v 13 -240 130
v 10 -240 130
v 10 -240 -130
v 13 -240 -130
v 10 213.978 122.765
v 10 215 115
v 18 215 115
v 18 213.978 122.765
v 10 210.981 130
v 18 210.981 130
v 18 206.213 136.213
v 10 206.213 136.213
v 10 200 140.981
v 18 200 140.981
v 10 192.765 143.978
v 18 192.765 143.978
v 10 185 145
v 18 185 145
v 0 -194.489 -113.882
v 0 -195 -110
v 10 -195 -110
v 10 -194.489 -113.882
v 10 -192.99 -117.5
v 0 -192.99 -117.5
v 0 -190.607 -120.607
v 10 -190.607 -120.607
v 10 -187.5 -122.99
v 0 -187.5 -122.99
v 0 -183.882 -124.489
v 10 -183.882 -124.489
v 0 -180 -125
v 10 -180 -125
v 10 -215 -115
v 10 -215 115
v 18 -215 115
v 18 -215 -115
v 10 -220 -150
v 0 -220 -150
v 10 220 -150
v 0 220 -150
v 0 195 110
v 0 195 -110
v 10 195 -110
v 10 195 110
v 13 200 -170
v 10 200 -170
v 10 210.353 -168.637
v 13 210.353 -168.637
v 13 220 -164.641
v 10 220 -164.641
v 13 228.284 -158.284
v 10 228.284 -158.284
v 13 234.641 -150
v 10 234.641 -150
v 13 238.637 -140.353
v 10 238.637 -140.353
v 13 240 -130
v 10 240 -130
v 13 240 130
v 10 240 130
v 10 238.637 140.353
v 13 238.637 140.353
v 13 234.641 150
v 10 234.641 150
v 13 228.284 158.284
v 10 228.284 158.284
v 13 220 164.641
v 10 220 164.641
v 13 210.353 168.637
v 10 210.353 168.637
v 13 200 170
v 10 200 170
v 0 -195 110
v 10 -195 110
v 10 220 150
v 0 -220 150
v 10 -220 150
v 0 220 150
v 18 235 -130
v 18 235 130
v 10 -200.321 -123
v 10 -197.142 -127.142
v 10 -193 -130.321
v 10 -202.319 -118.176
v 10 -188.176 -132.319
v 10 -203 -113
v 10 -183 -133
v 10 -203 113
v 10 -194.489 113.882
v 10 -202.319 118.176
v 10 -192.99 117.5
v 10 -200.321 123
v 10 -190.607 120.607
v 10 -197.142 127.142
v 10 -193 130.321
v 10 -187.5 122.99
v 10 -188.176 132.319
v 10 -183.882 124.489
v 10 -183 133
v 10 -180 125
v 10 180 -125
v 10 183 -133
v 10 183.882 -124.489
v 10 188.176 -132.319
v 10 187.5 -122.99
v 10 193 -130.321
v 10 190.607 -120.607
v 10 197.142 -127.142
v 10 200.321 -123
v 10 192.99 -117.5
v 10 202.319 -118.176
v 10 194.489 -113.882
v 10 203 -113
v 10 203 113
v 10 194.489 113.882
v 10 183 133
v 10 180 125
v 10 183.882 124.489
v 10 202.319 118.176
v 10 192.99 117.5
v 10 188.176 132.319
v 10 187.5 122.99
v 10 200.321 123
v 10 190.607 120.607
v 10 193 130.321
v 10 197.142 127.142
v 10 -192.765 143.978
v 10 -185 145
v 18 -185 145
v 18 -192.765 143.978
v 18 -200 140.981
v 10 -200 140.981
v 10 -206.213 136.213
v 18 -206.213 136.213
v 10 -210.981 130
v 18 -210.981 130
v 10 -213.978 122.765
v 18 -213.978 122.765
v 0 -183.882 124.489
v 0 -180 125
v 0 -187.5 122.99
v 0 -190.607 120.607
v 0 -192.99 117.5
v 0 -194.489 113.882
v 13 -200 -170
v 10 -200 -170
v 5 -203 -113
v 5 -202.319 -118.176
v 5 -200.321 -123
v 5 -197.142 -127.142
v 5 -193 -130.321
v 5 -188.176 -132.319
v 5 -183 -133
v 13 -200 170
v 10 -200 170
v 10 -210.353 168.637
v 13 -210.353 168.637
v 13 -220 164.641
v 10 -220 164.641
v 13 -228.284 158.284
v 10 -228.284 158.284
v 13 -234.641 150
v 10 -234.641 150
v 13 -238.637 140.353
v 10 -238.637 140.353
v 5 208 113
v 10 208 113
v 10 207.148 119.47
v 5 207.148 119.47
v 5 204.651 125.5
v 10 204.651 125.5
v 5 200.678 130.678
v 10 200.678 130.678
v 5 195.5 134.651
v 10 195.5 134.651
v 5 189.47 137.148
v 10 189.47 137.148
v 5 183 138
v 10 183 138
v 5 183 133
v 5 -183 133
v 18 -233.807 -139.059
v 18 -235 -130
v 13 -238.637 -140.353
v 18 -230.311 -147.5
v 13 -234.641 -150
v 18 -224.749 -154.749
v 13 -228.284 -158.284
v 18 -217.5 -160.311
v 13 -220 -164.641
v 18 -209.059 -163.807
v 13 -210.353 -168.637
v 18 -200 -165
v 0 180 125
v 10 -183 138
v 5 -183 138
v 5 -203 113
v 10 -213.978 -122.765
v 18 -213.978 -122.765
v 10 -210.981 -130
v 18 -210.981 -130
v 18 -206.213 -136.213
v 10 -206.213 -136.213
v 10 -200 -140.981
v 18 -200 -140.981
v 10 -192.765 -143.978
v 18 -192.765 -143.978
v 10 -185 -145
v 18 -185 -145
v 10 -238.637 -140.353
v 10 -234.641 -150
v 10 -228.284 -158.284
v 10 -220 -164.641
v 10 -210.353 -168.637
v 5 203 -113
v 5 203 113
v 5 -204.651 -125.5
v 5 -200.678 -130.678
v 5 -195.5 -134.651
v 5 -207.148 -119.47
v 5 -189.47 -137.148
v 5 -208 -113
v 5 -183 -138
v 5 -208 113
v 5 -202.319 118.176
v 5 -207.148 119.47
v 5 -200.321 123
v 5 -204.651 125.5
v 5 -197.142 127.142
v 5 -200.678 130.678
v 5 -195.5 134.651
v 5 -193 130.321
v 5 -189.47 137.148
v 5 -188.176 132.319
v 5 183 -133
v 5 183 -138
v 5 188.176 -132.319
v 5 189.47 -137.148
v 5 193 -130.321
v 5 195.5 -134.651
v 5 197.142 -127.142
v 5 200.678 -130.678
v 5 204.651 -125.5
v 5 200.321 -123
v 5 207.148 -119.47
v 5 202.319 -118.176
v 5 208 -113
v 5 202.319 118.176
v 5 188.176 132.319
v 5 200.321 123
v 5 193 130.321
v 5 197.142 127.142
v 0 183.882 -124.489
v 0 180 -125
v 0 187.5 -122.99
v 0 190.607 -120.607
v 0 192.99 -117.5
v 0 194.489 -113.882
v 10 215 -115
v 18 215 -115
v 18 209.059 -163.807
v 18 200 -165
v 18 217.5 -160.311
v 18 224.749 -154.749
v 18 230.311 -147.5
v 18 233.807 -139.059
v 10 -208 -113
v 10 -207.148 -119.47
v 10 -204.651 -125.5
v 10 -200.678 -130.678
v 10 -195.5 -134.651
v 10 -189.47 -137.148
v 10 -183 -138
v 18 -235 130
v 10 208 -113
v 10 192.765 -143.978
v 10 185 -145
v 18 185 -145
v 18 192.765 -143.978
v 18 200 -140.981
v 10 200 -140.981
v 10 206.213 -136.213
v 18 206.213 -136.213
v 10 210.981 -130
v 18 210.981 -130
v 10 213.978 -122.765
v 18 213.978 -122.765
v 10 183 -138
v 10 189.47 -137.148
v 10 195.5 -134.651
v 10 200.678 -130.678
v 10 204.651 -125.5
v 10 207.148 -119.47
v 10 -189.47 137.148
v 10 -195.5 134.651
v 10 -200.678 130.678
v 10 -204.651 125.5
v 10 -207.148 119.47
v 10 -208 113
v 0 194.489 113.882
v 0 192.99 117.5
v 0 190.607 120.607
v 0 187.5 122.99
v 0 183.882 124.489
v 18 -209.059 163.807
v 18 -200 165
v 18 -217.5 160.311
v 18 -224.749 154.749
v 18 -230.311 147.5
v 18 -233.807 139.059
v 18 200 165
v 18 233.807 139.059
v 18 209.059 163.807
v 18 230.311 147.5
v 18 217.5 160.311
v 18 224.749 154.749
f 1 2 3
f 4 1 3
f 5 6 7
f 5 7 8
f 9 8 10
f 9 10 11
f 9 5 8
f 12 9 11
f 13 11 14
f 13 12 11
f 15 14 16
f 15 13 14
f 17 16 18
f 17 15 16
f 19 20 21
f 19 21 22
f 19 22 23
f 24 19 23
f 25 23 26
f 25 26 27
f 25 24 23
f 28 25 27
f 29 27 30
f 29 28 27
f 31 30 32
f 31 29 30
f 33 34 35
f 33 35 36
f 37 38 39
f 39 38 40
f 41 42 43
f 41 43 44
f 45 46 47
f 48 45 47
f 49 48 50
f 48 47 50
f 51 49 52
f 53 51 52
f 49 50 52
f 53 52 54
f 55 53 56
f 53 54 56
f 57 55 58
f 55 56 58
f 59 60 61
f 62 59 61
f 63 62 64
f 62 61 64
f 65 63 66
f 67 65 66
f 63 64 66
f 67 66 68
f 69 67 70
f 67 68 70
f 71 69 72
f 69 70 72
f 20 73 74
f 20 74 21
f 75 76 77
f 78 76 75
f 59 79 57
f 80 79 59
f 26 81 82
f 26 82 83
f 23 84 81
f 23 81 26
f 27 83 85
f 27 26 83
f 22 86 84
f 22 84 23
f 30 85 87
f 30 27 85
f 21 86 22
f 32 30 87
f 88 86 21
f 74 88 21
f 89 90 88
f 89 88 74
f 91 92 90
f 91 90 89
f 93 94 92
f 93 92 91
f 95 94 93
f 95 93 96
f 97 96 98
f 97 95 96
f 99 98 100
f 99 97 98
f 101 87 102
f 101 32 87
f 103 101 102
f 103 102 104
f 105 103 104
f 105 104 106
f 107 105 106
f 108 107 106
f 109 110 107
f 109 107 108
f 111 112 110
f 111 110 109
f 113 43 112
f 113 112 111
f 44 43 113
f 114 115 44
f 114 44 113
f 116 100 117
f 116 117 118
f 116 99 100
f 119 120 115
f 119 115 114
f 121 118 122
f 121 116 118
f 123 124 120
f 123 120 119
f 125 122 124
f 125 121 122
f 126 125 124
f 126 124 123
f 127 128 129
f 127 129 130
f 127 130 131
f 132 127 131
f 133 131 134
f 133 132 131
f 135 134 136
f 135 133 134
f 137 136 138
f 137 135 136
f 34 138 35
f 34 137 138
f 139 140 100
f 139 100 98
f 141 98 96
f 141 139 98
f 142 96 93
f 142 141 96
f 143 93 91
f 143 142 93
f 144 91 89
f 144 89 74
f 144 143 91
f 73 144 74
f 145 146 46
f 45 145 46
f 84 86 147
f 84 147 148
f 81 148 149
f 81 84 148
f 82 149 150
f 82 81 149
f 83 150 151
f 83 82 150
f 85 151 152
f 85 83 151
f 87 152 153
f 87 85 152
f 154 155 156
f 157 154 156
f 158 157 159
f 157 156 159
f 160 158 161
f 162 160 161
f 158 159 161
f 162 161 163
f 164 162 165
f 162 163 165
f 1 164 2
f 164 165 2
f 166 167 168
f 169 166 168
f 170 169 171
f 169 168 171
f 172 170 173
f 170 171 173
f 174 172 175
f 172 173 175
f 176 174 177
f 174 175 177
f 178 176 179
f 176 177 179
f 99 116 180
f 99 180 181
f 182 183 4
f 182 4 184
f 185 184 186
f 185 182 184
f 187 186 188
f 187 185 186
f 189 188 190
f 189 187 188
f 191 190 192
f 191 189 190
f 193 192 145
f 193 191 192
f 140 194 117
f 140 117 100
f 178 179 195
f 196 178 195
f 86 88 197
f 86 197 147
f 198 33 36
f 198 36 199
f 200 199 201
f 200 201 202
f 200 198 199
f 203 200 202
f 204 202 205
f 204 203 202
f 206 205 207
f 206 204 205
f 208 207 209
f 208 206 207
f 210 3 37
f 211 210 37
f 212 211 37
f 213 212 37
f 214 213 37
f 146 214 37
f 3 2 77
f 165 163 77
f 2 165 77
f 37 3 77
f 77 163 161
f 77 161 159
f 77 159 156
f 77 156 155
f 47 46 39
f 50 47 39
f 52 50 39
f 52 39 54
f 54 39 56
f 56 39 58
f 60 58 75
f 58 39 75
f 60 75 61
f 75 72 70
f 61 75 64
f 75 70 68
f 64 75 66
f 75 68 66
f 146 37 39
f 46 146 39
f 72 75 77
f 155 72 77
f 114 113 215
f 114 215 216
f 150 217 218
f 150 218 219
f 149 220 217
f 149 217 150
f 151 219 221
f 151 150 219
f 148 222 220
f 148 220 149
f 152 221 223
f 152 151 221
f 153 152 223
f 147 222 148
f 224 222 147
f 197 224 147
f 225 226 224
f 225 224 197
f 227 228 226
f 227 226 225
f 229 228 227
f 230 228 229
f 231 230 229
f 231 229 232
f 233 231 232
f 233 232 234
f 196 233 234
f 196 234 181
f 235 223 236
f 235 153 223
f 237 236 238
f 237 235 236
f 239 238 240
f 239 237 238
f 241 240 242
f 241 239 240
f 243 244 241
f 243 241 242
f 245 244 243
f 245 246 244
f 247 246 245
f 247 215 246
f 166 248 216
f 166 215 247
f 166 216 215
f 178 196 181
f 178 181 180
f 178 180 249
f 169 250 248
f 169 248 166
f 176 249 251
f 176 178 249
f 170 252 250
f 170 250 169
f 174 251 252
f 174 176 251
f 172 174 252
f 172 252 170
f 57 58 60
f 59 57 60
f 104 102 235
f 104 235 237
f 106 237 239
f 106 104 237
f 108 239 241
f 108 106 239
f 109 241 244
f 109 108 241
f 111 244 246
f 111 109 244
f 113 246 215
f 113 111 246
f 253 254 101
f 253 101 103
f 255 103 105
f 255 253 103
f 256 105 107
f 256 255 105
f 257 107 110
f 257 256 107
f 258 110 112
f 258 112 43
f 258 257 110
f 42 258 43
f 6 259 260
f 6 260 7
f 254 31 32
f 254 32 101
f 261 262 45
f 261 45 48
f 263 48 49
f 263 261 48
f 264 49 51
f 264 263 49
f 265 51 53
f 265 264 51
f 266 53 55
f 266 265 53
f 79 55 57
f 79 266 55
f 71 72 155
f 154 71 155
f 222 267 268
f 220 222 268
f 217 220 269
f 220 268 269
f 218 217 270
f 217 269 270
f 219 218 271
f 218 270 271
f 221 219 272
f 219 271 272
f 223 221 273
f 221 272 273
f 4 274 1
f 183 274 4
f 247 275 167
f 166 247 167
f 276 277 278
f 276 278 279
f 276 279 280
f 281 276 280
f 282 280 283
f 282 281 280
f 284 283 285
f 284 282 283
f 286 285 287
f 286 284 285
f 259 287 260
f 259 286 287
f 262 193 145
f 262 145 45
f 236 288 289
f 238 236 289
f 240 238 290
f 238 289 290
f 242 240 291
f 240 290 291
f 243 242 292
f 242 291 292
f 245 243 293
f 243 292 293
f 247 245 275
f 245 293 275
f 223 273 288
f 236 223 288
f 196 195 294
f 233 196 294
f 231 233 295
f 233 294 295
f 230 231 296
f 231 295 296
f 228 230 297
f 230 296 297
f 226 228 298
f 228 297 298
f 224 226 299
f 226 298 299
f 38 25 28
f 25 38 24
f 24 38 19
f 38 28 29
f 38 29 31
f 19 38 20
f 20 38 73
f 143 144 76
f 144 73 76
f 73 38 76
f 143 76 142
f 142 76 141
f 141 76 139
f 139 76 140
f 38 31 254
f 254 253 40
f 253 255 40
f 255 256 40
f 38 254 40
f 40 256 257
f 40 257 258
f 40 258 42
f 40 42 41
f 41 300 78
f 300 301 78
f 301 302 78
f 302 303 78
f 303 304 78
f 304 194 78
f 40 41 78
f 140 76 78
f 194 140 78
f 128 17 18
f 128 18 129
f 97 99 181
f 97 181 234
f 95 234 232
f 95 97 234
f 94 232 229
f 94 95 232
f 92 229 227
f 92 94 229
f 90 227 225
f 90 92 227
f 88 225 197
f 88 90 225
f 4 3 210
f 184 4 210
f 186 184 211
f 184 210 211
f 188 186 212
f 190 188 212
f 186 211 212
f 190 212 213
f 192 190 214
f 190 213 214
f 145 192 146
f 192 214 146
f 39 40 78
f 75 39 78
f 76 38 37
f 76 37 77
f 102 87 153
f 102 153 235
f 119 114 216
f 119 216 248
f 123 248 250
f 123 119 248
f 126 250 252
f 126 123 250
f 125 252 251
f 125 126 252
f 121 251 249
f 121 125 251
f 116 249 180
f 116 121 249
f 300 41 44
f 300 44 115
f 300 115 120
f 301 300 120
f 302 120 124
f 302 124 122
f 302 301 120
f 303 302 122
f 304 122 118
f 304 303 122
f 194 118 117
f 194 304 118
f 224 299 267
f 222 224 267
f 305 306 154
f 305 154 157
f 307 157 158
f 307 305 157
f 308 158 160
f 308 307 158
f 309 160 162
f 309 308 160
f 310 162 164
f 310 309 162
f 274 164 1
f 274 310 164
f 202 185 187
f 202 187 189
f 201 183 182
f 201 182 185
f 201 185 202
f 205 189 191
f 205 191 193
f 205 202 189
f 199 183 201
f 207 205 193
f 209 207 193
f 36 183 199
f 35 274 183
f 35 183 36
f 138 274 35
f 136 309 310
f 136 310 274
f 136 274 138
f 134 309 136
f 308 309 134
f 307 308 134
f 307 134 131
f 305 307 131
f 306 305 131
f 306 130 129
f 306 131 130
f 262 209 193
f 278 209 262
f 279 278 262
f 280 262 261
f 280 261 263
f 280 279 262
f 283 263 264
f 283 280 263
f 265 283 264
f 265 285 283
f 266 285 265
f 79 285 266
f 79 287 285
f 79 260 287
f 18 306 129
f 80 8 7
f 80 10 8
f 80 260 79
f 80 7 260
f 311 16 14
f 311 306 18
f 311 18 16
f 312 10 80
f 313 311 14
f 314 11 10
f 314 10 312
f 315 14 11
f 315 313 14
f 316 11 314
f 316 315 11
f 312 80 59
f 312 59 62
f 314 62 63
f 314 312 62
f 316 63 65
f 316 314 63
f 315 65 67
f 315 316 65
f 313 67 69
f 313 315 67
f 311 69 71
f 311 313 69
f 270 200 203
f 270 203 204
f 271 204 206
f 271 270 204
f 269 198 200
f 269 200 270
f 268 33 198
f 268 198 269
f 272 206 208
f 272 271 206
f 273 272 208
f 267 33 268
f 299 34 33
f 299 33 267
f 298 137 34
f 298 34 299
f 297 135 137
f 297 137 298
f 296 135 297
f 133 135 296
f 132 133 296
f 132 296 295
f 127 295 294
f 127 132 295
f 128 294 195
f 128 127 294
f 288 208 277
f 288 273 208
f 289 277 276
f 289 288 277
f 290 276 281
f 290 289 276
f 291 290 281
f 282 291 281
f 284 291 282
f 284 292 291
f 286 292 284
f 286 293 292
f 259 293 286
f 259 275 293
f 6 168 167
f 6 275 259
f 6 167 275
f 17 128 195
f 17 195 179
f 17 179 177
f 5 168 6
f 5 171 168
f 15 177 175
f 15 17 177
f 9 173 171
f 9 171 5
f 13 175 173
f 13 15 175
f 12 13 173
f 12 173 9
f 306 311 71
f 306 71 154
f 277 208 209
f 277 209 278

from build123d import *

# Parameters (mm, degrees)
SKETCH_W     = 440
SKETCH_H     = 300
PAD_DEPTH    = 10
PAD001_DEPTH = 8
POCKET_DEPTH = 5
CHAMFER_SIZE = 5


with BuildPart() as part:
    # Sketch → Pad (new body)
    with BuildSketch(Plane.YZ):
        Rectangle(SKETCH_W, SKETCH_H)
        with BuildLine():
            Line((-195, 110), (-195, -110))
            ThreePointArc((-195, -110), (-190.606602, -120.606602), (-180, -125))
            Line((-180, -125), (180, -125))
            ThreePointArc((180, -125), (190.606602, -120.606602), (195, -110))
            Line((195, -110), (195, 110))
            ThreePointArc((195, 110), (190.606602, 120.606602), (180, 125))
            Line((180, 125), (-180, 125))
            ThreePointArc((-180, 125), (-190.606602, 120.606602), (-195, 110))
        make_face(mode=Mode.SUBTRACT)
    extrude(amount=PAD_DEPTH)

    # Sketch001 (on Face14 of Pad) → Pad001 (join)
    with BuildSketch(Plane.YZ.offset(10)):
        with BuildLine():
            Line((-240, 130), (-240, -130))
            ThreePointArc((-240, -130), (-228.284271, -158.284271), (-200, -170))
            Line((-200, -170), (200, -170))
            ThreePointArc((200, -170), (228.284271, -158.284271), (240, -130))
            Line((240, -130), (240, 130))
            ThreePointArc((240, 130), (228.284271, 158.284271), (200, 170))
            Line((200, 170), (-200, 170))
            ThreePointArc((-200, 170), (-228.284271, 158.284271), (-240, 130))
        make_face()
        with BuildLine():
            Line((-215, 115), (-215, -115))
            ThreePointArc((-215, -115), (-206.213203, -136.213203), (-185, -145))
            Line((-185, -145), (185, -145))
            ThreePointArc((185, -145), (206.213203, -136.213203), (215, -115))
            Line((215, -115), (215, 115))
            ThreePointArc((215, 115), (206.213203, 136.213203), (185, 145))
            Line((185, 145), (-185, 145))
            ThreePointArc((-185, 145), (-206.213203, 136.213203), (-215, 115))
        make_face(mode=Mode.SUBTRACT)
    extrude(amount=PAD001_DEPTH)

    # Sketch002 (on Face23 of Pad001) → Pocket (cut)
    with BuildSketch(Plane.YZ.offset(10)):
        with BuildLine():
            Line((-208, 113), (-208, -113))
            ThreePointArc((-208, -113), (-200.67767, -130.67767), (-183, -138))
            Line((-183, -138), (183, -138))
            ThreePointArc((183, -138), (200.67767, -130.67767), (208, -113))
            Line((208, -113), (208, 113))
            ThreePointArc((208, 113), (200.67767, 130.67767), (183, 138))
            Line((183, 138), (-183, 138))
            ThreePointArc((-183, 138), (-200.67767, 130.67767), (-208, 113))
        make_face()
        with BuildLine():
            Line((-203, 113), (-203, -113))
            ThreePointArc((-203, -113), (-197.142136, -127.142136), (-183, -133))
            Line((-183, -133), (183, -133))
            ThreePointArc((183, -133), (197.142136, -127.142136), (203, -113))
            Line((203, -113), (203, 113))
            ThreePointArc((203, 113), (197.142136, 127.142136), (183, 133))
            Line((183, 133), (-183, 133))
            ThreePointArc((-183, 133), (-197.142136, 127.142136), (-203, 113))
        make_face(mode=Mode.SUBTRACT)
    extrude(amount=-POCKET_DEPTH, mode=Mode.SUBTRACT)

    # Chamfer
    chamfer_edges = [part.edges().sort_by_distance(p)[0] for p in [
        (18, -240, 0),
        (18, -228.284271, 158.284271),
        (18, 0, 170),
        (18, -228.284271, -158.284271),
        (18, 0, -170),
        (18, 240, 0),
        (18, 228.284271, -158.284271),
        (18, 228.284271, 158.284271),
    ]]
    chamfer(chamfer_edges, length=CHAMFER_SIZE)


solid = part.part
